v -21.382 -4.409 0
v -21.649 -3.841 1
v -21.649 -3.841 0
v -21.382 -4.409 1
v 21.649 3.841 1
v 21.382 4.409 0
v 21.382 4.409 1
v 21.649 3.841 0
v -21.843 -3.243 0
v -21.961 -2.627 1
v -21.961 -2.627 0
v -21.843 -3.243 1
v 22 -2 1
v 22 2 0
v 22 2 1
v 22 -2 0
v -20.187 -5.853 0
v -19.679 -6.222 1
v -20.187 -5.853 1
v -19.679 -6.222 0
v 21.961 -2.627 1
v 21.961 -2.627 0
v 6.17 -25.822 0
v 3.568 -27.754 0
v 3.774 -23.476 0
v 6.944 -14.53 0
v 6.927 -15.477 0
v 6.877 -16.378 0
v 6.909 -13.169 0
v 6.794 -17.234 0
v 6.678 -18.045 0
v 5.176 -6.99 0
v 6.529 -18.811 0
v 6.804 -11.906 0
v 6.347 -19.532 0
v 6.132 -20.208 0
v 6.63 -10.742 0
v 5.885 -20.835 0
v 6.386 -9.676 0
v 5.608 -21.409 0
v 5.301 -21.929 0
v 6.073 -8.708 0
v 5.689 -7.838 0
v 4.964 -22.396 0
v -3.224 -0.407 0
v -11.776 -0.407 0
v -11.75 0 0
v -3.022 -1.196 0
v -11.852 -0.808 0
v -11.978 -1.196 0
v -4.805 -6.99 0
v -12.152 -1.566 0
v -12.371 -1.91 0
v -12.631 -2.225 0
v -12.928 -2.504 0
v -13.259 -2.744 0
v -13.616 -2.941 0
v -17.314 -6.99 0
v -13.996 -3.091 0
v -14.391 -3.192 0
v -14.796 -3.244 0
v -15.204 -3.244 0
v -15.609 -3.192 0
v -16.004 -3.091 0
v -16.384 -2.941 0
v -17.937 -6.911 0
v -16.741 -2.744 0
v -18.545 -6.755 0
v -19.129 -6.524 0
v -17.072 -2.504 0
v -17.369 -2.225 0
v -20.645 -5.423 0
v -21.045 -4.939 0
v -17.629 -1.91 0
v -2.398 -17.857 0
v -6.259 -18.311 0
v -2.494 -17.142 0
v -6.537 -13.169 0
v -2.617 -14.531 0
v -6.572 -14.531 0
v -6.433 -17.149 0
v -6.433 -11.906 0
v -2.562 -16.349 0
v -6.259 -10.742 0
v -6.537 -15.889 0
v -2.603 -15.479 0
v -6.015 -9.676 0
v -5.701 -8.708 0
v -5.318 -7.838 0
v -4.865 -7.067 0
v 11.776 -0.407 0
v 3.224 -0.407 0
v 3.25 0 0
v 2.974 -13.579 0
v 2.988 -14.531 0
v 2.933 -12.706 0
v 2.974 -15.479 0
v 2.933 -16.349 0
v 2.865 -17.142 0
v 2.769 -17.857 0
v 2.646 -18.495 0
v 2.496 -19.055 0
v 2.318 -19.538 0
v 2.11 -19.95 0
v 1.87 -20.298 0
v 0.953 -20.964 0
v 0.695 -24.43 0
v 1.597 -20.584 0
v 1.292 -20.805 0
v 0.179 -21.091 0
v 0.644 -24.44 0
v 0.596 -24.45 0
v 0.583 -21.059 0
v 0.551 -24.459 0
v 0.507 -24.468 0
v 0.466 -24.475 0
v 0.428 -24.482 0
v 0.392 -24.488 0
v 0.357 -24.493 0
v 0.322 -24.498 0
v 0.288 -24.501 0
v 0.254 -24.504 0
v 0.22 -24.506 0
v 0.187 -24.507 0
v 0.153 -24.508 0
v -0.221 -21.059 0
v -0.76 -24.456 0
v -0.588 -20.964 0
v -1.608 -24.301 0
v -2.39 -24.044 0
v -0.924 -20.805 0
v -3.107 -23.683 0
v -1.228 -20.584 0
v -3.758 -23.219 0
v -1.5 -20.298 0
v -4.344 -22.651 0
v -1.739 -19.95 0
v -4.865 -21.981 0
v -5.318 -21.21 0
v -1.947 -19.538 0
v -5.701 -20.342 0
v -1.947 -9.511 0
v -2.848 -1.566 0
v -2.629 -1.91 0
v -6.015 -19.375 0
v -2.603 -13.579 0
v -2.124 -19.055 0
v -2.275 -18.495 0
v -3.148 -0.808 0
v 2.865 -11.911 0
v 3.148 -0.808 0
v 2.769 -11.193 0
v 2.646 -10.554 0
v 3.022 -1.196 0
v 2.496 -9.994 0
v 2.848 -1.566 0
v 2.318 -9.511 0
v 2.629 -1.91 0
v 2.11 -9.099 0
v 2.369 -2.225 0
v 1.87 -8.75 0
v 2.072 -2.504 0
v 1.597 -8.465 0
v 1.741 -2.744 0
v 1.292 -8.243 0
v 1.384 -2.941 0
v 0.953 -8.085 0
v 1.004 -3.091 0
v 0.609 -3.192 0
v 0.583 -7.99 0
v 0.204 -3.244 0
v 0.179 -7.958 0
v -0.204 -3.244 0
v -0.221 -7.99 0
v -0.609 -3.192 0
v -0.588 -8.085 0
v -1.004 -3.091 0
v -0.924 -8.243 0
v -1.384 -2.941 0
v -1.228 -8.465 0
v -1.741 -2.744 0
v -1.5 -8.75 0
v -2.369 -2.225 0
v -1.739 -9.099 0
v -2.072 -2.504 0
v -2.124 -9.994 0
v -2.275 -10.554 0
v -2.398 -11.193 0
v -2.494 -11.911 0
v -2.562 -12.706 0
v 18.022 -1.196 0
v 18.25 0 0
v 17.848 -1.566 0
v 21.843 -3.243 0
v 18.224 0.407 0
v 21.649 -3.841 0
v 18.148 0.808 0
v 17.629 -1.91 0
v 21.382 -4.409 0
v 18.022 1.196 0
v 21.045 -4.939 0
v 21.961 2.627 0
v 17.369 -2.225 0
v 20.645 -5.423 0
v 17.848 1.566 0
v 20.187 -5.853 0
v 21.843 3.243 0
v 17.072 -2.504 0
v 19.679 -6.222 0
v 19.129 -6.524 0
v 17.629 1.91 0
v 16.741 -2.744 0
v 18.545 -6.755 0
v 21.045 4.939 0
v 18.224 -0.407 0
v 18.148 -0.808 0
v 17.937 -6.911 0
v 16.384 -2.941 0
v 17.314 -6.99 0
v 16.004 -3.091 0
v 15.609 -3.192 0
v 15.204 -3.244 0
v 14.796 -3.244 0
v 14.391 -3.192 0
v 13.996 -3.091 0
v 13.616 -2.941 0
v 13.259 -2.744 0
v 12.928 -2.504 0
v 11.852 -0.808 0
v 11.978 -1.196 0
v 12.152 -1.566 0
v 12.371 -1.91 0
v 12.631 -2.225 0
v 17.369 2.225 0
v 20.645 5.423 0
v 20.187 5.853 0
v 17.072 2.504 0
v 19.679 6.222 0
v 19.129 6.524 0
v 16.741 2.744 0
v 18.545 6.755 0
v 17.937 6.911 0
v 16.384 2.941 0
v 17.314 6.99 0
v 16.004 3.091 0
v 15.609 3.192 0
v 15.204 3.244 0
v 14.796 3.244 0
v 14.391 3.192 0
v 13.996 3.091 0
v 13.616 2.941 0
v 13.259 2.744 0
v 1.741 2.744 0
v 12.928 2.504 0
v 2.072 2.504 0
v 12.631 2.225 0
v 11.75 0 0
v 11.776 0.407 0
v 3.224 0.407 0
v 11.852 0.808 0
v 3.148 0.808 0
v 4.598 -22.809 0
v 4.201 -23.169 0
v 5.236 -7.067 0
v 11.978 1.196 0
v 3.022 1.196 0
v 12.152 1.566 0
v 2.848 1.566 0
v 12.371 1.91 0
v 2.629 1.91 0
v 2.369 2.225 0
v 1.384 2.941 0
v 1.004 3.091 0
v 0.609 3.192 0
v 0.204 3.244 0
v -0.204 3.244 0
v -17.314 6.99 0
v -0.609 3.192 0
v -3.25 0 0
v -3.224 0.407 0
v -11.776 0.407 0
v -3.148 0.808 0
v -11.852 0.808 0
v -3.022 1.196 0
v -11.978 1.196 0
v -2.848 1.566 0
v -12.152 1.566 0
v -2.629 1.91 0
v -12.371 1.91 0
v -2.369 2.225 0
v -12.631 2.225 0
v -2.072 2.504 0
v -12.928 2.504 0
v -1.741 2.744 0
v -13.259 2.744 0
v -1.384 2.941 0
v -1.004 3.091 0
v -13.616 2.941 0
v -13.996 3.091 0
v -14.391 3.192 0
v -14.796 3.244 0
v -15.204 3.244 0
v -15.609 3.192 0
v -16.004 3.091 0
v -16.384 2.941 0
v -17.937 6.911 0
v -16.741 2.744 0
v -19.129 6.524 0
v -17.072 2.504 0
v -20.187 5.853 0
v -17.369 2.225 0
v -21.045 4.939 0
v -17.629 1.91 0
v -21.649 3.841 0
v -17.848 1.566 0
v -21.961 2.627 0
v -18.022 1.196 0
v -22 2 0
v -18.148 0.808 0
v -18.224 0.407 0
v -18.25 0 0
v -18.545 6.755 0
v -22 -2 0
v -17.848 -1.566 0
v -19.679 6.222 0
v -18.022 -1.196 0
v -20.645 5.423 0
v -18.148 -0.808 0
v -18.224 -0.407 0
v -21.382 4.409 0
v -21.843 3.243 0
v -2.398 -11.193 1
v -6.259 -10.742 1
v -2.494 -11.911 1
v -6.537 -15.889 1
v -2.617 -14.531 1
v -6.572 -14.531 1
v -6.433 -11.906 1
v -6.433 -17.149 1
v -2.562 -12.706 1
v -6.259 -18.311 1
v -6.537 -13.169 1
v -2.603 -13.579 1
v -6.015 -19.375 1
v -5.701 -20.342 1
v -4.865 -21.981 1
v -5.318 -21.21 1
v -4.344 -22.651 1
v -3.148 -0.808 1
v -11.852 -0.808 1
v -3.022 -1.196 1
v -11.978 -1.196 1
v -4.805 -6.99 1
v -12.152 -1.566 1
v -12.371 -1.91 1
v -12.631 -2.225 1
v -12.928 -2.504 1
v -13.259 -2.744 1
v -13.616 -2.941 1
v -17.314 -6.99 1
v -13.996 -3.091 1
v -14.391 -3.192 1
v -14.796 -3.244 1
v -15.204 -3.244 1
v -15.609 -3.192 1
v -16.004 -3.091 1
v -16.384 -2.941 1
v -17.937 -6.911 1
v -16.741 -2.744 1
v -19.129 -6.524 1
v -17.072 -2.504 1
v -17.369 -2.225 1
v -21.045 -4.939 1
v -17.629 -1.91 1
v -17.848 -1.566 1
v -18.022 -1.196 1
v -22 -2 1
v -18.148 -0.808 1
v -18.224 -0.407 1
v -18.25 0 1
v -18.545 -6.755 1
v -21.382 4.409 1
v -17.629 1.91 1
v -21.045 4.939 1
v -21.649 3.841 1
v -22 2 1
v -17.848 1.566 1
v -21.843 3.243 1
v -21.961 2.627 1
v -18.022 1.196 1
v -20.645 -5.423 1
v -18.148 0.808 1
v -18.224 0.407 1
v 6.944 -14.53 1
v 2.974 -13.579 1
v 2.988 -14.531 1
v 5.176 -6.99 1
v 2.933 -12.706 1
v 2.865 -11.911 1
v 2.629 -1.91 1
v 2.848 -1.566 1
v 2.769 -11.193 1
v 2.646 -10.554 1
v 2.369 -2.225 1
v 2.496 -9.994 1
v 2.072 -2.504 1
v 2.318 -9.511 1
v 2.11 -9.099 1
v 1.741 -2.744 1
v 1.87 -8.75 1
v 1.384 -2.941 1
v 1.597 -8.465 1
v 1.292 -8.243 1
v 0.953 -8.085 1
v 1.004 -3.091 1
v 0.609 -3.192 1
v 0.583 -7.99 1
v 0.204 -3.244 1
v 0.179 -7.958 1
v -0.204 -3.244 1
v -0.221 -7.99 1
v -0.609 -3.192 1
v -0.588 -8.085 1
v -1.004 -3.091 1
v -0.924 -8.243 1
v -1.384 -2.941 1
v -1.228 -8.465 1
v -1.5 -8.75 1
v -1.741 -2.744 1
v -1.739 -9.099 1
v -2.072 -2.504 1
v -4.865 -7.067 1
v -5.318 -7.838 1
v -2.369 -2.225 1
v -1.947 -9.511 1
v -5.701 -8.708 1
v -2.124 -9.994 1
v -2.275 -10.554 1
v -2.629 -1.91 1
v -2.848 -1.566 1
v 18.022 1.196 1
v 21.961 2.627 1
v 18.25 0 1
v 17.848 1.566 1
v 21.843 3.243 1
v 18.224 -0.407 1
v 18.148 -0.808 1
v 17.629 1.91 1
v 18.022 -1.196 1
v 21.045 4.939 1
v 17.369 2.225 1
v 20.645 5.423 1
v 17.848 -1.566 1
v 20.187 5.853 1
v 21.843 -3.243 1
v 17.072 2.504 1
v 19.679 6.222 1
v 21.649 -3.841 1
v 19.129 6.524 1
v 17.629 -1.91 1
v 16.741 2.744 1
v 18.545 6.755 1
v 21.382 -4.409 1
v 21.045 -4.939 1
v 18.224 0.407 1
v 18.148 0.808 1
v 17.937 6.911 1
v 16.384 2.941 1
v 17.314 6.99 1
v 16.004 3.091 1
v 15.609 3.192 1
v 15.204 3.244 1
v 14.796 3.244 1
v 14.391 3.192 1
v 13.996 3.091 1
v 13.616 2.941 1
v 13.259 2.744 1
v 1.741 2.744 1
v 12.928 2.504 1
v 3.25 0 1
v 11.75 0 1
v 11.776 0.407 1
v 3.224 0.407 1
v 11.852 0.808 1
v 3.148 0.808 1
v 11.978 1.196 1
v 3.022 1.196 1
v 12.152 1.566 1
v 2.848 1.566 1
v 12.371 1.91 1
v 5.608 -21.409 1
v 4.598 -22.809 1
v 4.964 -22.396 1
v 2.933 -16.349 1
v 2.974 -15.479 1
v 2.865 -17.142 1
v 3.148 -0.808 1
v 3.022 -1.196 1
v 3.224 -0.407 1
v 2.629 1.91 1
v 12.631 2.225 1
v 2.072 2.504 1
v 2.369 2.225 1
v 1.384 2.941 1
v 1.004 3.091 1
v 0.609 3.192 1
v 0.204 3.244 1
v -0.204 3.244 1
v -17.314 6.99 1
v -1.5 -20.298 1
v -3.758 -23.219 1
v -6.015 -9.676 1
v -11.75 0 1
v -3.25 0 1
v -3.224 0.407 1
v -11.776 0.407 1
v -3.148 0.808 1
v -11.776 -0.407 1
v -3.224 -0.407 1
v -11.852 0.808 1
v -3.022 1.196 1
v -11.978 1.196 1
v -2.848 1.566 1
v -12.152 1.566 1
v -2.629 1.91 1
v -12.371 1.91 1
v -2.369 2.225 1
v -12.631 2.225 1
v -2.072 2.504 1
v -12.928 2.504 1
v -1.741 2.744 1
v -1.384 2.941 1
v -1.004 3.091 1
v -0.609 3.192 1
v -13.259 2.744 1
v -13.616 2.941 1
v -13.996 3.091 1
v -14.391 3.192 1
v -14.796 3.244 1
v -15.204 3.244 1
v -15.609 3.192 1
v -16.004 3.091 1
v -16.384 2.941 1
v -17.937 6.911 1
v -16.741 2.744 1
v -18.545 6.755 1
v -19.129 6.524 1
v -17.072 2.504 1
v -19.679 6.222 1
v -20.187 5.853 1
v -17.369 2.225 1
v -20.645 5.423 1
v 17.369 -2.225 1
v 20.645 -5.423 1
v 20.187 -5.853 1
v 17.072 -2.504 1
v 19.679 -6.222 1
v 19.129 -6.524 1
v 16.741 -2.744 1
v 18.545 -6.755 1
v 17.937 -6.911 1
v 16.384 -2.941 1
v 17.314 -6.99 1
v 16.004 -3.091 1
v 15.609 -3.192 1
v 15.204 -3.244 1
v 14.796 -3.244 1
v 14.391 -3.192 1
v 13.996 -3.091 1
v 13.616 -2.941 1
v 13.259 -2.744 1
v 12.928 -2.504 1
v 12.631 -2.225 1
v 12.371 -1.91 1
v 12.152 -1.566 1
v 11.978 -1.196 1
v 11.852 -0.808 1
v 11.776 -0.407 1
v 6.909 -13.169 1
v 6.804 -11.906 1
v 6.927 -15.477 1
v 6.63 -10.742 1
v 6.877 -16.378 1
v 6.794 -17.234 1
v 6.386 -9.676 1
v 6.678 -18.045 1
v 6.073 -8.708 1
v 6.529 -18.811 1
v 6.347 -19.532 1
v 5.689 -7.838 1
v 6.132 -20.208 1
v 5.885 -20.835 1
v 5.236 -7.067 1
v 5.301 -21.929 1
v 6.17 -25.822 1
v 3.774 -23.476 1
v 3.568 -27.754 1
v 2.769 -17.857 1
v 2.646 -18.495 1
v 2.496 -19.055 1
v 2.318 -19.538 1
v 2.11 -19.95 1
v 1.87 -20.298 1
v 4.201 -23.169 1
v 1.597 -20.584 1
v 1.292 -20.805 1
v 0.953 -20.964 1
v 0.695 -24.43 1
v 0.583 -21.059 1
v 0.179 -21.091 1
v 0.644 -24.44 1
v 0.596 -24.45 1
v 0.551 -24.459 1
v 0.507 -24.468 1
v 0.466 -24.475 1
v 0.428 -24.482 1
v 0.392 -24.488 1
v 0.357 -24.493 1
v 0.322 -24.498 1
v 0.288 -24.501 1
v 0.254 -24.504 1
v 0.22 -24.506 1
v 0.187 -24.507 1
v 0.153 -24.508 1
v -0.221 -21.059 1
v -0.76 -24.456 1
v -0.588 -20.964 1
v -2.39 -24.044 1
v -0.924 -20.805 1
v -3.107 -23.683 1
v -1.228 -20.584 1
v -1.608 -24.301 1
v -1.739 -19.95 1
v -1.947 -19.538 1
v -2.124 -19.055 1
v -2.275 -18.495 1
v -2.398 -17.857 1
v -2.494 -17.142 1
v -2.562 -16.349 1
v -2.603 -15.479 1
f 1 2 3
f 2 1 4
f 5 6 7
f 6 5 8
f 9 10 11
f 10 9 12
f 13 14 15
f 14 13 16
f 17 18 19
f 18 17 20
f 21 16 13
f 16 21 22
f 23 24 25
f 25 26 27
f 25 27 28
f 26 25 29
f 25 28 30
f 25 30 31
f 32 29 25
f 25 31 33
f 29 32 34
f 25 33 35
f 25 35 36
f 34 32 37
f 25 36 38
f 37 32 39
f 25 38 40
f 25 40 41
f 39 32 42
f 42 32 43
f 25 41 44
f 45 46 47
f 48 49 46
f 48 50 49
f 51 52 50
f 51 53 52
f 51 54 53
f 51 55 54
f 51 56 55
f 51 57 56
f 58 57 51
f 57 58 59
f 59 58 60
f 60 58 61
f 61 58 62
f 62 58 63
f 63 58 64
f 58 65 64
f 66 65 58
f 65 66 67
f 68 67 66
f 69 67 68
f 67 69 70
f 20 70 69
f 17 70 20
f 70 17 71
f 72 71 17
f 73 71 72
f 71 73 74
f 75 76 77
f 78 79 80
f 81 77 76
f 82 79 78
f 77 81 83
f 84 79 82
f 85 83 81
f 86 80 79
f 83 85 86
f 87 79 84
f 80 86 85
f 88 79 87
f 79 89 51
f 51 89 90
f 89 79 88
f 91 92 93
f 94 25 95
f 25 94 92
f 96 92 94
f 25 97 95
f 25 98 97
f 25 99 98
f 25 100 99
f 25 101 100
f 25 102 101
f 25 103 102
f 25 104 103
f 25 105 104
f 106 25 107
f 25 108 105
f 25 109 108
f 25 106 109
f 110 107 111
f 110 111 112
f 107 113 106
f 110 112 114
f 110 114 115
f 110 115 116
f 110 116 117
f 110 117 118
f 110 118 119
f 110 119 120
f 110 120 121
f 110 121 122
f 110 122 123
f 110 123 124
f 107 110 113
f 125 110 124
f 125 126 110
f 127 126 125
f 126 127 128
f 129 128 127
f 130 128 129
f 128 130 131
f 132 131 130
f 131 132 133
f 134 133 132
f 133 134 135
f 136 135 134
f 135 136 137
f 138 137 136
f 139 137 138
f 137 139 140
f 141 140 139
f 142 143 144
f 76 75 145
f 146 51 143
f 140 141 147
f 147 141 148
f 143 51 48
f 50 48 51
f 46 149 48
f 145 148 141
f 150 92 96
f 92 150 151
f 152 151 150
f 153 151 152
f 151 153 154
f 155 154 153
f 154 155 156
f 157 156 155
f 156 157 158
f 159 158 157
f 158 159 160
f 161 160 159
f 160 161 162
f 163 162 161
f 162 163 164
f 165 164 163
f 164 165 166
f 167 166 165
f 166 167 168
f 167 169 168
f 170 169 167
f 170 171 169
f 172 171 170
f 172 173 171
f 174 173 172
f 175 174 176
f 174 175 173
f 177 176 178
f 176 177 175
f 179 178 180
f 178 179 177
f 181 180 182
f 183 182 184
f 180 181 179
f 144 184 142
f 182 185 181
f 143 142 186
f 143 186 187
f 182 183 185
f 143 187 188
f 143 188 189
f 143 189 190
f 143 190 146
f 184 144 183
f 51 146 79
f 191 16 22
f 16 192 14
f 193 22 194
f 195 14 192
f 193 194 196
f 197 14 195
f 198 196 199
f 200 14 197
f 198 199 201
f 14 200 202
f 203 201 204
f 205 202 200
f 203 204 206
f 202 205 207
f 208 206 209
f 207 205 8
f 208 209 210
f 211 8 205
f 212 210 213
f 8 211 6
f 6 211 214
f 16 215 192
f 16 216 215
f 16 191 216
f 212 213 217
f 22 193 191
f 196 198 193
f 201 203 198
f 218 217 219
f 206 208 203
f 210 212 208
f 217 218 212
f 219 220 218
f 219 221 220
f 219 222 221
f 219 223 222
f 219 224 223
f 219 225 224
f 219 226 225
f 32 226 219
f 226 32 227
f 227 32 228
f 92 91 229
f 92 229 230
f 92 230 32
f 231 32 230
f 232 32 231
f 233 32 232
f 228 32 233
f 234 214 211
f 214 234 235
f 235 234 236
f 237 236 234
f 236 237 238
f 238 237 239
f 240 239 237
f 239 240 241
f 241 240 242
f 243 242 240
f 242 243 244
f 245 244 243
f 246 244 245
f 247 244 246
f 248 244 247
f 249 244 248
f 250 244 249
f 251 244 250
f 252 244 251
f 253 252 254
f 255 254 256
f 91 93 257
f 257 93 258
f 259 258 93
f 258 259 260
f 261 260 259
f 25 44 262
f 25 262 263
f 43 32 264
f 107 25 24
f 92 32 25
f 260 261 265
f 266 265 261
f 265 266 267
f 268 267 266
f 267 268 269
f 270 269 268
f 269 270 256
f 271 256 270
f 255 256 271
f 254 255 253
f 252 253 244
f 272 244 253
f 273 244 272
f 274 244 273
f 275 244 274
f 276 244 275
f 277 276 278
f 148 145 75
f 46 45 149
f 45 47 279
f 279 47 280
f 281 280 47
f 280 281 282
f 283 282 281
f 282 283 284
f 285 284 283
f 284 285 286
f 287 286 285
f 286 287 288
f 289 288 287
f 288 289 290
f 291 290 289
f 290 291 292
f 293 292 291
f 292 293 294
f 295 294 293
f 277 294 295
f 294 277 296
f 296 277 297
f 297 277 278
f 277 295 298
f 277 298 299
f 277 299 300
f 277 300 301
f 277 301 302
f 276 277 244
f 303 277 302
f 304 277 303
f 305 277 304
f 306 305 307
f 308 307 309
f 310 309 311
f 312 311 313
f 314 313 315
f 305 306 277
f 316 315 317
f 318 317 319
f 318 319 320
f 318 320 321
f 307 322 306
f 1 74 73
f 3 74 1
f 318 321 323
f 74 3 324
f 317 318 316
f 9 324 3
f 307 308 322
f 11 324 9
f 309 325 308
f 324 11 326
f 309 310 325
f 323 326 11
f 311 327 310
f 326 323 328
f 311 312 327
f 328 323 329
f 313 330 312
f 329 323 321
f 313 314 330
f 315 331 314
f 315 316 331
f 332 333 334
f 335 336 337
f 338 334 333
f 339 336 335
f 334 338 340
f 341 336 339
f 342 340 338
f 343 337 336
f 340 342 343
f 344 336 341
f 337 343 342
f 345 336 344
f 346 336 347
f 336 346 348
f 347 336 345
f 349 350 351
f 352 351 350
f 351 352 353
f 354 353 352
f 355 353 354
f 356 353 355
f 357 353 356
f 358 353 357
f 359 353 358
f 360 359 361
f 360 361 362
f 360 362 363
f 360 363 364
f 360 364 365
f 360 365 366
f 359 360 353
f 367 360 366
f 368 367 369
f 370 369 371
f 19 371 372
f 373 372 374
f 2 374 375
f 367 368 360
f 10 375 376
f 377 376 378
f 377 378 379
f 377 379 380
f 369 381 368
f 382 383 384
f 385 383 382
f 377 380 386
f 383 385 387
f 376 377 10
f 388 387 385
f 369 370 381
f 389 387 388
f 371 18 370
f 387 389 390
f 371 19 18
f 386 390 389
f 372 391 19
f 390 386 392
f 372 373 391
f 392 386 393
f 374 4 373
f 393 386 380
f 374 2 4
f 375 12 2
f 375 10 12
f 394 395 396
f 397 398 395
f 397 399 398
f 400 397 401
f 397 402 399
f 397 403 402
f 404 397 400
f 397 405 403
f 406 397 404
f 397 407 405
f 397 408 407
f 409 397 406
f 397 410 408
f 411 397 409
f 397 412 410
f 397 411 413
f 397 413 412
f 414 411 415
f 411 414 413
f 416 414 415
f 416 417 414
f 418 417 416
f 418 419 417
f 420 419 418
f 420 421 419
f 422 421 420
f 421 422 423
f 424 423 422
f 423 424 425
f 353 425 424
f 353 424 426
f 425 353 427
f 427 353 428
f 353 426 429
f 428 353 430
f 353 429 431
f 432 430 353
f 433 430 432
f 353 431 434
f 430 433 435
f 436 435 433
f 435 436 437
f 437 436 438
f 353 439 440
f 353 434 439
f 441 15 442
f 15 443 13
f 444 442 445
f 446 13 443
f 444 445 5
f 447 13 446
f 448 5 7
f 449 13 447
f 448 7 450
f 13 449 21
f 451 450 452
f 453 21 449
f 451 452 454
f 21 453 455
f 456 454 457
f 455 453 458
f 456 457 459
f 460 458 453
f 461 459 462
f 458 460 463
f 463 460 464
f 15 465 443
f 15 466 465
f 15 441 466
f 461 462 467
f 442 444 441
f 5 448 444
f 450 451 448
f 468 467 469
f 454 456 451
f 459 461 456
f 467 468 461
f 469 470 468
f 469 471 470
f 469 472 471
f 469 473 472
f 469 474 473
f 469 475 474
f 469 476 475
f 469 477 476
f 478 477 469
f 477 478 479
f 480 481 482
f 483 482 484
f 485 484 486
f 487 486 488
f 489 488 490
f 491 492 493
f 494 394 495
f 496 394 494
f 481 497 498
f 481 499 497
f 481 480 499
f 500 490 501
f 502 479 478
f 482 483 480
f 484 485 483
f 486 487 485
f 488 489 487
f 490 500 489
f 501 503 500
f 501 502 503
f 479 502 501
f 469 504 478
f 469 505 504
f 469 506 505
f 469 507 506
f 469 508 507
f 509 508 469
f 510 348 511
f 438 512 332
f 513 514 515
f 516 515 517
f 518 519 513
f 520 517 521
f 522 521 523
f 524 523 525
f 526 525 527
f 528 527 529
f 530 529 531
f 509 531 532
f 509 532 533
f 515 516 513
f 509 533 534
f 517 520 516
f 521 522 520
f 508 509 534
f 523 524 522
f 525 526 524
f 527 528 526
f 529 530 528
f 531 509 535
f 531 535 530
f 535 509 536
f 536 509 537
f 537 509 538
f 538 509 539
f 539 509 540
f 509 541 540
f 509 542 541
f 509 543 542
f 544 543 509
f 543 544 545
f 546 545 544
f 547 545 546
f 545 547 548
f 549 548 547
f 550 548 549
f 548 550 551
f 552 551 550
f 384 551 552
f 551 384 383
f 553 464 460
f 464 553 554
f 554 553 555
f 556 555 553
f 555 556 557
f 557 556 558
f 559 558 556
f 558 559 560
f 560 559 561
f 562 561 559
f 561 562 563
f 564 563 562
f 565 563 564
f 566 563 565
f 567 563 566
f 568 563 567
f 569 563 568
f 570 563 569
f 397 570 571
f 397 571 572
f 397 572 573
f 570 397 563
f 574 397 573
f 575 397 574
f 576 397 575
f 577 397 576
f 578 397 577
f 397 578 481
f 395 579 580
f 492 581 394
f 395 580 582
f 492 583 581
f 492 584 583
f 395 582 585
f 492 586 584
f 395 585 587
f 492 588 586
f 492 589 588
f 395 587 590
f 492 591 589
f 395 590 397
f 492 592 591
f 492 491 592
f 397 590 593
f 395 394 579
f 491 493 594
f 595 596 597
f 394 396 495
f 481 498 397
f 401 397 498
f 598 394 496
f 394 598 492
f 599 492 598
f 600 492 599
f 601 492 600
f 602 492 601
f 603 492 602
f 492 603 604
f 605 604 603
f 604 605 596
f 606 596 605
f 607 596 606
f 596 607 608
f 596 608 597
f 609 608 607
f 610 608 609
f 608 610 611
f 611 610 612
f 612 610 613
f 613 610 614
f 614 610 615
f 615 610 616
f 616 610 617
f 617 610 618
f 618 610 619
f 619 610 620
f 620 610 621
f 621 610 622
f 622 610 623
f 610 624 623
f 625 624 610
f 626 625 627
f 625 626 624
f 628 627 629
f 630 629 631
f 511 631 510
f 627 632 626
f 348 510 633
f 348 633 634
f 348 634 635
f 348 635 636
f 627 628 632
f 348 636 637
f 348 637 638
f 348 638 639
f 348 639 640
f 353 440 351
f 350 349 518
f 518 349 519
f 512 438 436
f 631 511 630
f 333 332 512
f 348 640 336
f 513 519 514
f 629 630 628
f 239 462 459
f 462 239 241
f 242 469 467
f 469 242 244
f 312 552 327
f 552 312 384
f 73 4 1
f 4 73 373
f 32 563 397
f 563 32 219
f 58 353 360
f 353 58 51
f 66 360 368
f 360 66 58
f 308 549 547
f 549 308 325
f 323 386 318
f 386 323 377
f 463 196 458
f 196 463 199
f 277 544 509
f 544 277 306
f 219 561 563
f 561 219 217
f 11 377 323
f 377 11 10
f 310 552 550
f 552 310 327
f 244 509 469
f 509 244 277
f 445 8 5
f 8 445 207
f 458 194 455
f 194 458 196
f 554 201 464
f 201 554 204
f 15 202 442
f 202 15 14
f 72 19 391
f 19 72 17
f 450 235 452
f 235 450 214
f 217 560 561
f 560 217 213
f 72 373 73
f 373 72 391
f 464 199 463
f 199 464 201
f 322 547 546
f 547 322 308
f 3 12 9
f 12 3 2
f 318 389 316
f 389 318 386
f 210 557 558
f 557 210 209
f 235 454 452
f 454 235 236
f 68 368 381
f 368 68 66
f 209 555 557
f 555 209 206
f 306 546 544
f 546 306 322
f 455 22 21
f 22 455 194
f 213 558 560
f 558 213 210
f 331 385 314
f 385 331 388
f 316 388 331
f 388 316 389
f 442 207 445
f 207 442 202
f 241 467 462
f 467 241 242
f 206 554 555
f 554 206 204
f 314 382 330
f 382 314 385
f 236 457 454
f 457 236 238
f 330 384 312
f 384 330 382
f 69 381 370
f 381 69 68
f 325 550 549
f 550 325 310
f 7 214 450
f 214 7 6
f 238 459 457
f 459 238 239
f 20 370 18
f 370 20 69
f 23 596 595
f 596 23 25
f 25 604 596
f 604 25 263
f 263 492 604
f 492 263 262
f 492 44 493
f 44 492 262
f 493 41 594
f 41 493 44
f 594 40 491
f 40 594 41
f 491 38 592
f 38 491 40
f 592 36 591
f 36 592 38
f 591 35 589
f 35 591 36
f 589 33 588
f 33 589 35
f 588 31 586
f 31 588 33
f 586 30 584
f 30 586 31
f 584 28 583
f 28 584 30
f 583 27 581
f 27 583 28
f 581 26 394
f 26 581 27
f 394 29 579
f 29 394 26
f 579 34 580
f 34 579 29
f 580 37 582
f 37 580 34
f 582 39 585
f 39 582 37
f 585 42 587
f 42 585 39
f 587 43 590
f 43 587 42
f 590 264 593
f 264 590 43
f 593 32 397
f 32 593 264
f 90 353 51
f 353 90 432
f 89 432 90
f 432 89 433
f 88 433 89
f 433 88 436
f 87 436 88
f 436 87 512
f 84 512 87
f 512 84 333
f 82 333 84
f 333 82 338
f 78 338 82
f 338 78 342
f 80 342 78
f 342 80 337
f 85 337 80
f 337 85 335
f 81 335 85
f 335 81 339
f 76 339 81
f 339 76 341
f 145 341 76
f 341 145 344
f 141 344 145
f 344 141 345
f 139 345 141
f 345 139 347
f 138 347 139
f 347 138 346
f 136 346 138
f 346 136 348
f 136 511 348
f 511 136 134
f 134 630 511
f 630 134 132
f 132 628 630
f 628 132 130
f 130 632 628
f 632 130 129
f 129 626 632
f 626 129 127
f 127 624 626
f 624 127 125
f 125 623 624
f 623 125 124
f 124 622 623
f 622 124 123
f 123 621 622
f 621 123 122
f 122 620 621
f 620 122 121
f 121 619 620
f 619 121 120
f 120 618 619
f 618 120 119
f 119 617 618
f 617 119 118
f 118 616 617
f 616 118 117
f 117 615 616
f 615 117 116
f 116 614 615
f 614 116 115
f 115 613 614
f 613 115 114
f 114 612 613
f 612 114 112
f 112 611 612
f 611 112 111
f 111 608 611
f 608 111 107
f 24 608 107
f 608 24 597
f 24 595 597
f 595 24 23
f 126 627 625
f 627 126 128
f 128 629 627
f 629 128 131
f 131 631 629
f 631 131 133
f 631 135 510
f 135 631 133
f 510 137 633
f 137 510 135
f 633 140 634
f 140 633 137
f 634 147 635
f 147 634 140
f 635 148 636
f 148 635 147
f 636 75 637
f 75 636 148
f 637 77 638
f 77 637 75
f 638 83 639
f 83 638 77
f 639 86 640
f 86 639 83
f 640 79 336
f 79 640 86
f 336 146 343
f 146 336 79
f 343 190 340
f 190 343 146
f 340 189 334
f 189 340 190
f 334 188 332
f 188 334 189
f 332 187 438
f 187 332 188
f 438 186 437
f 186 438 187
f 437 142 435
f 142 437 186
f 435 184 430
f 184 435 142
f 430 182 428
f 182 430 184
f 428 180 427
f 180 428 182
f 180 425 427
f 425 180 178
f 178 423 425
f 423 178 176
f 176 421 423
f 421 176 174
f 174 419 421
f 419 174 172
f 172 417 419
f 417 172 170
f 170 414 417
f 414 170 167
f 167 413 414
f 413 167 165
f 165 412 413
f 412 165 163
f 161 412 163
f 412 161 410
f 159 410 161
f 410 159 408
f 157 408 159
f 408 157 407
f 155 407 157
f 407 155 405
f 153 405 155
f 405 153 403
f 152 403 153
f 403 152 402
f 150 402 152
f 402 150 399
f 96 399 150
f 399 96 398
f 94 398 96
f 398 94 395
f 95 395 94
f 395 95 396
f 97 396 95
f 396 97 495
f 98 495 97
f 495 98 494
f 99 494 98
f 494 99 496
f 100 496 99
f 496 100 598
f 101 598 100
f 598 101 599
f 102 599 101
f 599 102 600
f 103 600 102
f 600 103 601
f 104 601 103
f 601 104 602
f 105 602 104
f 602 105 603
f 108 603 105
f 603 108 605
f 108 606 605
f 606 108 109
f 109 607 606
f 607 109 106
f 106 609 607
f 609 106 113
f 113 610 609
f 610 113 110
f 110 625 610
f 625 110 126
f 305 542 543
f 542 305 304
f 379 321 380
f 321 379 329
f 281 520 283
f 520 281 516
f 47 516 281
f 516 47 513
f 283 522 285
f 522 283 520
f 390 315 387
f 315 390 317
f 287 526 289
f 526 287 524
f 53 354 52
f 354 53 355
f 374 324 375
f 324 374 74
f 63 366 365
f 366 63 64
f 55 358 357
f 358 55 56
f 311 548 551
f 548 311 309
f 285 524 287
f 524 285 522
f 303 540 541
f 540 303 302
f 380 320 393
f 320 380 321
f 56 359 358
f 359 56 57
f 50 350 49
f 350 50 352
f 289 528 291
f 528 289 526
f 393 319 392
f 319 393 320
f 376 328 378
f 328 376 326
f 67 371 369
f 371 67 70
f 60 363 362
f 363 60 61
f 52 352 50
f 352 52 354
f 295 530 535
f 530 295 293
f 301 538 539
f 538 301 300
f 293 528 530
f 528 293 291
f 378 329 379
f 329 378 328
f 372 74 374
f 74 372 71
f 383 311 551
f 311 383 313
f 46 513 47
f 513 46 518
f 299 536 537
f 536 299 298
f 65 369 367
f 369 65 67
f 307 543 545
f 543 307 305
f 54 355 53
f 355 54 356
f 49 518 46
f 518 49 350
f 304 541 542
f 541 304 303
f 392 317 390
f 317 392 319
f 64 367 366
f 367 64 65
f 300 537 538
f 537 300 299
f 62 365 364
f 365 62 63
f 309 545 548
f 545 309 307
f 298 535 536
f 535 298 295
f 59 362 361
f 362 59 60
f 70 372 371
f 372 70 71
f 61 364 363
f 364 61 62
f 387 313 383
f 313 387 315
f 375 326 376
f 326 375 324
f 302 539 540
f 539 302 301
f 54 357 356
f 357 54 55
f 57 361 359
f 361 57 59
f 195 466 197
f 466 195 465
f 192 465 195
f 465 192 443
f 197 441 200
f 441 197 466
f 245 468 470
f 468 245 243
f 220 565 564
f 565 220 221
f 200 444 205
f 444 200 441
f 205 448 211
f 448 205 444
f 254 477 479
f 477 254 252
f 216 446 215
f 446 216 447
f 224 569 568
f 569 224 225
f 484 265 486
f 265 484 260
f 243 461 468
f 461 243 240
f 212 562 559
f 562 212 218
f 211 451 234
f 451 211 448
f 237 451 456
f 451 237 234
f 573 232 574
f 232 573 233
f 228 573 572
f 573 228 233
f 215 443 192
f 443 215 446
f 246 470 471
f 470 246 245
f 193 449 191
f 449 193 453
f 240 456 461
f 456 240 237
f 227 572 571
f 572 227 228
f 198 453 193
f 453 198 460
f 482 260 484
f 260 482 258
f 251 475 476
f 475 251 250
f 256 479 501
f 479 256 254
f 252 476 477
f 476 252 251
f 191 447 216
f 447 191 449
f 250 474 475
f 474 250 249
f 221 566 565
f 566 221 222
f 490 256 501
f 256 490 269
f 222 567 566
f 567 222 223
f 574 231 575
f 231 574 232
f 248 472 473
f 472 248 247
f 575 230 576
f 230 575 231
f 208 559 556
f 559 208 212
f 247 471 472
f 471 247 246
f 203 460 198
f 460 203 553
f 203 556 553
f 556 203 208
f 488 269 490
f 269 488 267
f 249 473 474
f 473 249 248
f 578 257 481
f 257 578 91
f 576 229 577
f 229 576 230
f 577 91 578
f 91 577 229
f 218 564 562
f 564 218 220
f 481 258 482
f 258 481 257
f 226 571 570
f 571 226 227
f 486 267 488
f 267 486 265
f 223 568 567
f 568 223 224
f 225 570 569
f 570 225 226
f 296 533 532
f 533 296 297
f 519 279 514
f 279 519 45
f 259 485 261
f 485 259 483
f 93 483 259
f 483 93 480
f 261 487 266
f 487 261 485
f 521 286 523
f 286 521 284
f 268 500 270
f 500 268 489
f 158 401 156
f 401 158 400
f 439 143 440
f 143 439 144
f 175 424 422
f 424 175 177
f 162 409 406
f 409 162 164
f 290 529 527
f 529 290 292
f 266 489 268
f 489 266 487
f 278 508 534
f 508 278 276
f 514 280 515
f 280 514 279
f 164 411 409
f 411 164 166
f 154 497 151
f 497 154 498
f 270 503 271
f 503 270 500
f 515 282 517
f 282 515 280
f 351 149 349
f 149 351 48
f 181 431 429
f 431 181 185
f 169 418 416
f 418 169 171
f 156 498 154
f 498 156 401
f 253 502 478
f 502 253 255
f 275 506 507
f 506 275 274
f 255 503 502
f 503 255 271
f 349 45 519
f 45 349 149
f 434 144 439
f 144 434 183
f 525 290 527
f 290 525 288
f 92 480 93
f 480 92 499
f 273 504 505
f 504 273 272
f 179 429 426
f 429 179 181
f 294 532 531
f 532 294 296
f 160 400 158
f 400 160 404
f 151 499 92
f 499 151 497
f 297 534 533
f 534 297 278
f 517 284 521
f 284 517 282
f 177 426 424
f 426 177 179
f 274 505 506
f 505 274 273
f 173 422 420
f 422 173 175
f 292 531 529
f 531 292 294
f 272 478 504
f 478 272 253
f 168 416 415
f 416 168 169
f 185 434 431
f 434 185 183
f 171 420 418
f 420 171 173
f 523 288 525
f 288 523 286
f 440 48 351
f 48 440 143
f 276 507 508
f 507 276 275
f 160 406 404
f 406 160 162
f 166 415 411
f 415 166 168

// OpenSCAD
$fn = 50;


difference() {
	union() {
		translate(v = [0, 0, 0]) {
			rotate(a = [0, 0, 0]) {
				hull() {
					translate(v = [-17.0000000000, 2.0000000000, 0]) {
						rotate(a = [0, 0, 0]) {
							translate(v = [0, 0, 0]) {
								rotate(a = [0, 0, 0]) {
									cylinder(h = 1, r = 5);
								}
							}
						}
					}
					translate(v = [17.0000000000, 2.0000000000, 0]) {
						rotate(a = [0, 0, 0]) {
							translate(v = [0, 0, 0]) {
								rotate(a = [0, 0, 0]) {
									cylinder(h = 1, r = 5);
								}
							}
						}
					}
					translate(v = [-17.0000000000, -2.0000000000, 0]) {
						rotate(a = [0, 0, 0]) {
							translate(v = [0, 0, 0]) {
								rotate(a = [0, 0, 0]) {
									cylinder(h = 1, r = 5);
								}
							}
						}
					}
					translate(v = [17.0000000000, -2.0000000000, 0]) {
						rotate(a = [0, 0, 0]) {
							translate(v = [0, 0, 0]) {
								rotate(a = [0, 0, 0]) {
									cylinder(h = 1, r = 5);
								}
							}
						}
					}
				}
			}
		}
		translate(v = [0, -5, 0]) {
			rotate(a = [0, 0, 0]) {
				linear_extrude(height = 1) {
					text(font = "DejaVu Sans Mono:style=Bold", halign = "center", size = 19.0000000000, text = "Q", valign = "top");
				}
			}
		}
	}
	union() {
		translate(v = [-15.0000000000, 0.0000000000, -125.0000000000]) {
			rotate(a = [0, 0, 0]) {
				cylinder(h = 250, r = 3.2500000000);
			}
		}
		translate(v = [15.0000000000, 0.0000000000, -125.0000000000]) {
			rotate(a = [0, 0, 0]) {
				cylinder(h = 250, r = 3.2500000000);
			}
		}
		translate(v = [15.0000000000, 0.0000000000, -125.0000000000]) {
			rotate(a = [0, 0, 0]) {
				cylinder(h = 250, r = 3.2500000000);
			}
		}
		translate(v = [0, 0, -125.0000000000]) {
			rotate(a = [0, 0, 0]) {
				cylinder(h = 250, r = 3.2500000000);
			}
		}
	}
}
